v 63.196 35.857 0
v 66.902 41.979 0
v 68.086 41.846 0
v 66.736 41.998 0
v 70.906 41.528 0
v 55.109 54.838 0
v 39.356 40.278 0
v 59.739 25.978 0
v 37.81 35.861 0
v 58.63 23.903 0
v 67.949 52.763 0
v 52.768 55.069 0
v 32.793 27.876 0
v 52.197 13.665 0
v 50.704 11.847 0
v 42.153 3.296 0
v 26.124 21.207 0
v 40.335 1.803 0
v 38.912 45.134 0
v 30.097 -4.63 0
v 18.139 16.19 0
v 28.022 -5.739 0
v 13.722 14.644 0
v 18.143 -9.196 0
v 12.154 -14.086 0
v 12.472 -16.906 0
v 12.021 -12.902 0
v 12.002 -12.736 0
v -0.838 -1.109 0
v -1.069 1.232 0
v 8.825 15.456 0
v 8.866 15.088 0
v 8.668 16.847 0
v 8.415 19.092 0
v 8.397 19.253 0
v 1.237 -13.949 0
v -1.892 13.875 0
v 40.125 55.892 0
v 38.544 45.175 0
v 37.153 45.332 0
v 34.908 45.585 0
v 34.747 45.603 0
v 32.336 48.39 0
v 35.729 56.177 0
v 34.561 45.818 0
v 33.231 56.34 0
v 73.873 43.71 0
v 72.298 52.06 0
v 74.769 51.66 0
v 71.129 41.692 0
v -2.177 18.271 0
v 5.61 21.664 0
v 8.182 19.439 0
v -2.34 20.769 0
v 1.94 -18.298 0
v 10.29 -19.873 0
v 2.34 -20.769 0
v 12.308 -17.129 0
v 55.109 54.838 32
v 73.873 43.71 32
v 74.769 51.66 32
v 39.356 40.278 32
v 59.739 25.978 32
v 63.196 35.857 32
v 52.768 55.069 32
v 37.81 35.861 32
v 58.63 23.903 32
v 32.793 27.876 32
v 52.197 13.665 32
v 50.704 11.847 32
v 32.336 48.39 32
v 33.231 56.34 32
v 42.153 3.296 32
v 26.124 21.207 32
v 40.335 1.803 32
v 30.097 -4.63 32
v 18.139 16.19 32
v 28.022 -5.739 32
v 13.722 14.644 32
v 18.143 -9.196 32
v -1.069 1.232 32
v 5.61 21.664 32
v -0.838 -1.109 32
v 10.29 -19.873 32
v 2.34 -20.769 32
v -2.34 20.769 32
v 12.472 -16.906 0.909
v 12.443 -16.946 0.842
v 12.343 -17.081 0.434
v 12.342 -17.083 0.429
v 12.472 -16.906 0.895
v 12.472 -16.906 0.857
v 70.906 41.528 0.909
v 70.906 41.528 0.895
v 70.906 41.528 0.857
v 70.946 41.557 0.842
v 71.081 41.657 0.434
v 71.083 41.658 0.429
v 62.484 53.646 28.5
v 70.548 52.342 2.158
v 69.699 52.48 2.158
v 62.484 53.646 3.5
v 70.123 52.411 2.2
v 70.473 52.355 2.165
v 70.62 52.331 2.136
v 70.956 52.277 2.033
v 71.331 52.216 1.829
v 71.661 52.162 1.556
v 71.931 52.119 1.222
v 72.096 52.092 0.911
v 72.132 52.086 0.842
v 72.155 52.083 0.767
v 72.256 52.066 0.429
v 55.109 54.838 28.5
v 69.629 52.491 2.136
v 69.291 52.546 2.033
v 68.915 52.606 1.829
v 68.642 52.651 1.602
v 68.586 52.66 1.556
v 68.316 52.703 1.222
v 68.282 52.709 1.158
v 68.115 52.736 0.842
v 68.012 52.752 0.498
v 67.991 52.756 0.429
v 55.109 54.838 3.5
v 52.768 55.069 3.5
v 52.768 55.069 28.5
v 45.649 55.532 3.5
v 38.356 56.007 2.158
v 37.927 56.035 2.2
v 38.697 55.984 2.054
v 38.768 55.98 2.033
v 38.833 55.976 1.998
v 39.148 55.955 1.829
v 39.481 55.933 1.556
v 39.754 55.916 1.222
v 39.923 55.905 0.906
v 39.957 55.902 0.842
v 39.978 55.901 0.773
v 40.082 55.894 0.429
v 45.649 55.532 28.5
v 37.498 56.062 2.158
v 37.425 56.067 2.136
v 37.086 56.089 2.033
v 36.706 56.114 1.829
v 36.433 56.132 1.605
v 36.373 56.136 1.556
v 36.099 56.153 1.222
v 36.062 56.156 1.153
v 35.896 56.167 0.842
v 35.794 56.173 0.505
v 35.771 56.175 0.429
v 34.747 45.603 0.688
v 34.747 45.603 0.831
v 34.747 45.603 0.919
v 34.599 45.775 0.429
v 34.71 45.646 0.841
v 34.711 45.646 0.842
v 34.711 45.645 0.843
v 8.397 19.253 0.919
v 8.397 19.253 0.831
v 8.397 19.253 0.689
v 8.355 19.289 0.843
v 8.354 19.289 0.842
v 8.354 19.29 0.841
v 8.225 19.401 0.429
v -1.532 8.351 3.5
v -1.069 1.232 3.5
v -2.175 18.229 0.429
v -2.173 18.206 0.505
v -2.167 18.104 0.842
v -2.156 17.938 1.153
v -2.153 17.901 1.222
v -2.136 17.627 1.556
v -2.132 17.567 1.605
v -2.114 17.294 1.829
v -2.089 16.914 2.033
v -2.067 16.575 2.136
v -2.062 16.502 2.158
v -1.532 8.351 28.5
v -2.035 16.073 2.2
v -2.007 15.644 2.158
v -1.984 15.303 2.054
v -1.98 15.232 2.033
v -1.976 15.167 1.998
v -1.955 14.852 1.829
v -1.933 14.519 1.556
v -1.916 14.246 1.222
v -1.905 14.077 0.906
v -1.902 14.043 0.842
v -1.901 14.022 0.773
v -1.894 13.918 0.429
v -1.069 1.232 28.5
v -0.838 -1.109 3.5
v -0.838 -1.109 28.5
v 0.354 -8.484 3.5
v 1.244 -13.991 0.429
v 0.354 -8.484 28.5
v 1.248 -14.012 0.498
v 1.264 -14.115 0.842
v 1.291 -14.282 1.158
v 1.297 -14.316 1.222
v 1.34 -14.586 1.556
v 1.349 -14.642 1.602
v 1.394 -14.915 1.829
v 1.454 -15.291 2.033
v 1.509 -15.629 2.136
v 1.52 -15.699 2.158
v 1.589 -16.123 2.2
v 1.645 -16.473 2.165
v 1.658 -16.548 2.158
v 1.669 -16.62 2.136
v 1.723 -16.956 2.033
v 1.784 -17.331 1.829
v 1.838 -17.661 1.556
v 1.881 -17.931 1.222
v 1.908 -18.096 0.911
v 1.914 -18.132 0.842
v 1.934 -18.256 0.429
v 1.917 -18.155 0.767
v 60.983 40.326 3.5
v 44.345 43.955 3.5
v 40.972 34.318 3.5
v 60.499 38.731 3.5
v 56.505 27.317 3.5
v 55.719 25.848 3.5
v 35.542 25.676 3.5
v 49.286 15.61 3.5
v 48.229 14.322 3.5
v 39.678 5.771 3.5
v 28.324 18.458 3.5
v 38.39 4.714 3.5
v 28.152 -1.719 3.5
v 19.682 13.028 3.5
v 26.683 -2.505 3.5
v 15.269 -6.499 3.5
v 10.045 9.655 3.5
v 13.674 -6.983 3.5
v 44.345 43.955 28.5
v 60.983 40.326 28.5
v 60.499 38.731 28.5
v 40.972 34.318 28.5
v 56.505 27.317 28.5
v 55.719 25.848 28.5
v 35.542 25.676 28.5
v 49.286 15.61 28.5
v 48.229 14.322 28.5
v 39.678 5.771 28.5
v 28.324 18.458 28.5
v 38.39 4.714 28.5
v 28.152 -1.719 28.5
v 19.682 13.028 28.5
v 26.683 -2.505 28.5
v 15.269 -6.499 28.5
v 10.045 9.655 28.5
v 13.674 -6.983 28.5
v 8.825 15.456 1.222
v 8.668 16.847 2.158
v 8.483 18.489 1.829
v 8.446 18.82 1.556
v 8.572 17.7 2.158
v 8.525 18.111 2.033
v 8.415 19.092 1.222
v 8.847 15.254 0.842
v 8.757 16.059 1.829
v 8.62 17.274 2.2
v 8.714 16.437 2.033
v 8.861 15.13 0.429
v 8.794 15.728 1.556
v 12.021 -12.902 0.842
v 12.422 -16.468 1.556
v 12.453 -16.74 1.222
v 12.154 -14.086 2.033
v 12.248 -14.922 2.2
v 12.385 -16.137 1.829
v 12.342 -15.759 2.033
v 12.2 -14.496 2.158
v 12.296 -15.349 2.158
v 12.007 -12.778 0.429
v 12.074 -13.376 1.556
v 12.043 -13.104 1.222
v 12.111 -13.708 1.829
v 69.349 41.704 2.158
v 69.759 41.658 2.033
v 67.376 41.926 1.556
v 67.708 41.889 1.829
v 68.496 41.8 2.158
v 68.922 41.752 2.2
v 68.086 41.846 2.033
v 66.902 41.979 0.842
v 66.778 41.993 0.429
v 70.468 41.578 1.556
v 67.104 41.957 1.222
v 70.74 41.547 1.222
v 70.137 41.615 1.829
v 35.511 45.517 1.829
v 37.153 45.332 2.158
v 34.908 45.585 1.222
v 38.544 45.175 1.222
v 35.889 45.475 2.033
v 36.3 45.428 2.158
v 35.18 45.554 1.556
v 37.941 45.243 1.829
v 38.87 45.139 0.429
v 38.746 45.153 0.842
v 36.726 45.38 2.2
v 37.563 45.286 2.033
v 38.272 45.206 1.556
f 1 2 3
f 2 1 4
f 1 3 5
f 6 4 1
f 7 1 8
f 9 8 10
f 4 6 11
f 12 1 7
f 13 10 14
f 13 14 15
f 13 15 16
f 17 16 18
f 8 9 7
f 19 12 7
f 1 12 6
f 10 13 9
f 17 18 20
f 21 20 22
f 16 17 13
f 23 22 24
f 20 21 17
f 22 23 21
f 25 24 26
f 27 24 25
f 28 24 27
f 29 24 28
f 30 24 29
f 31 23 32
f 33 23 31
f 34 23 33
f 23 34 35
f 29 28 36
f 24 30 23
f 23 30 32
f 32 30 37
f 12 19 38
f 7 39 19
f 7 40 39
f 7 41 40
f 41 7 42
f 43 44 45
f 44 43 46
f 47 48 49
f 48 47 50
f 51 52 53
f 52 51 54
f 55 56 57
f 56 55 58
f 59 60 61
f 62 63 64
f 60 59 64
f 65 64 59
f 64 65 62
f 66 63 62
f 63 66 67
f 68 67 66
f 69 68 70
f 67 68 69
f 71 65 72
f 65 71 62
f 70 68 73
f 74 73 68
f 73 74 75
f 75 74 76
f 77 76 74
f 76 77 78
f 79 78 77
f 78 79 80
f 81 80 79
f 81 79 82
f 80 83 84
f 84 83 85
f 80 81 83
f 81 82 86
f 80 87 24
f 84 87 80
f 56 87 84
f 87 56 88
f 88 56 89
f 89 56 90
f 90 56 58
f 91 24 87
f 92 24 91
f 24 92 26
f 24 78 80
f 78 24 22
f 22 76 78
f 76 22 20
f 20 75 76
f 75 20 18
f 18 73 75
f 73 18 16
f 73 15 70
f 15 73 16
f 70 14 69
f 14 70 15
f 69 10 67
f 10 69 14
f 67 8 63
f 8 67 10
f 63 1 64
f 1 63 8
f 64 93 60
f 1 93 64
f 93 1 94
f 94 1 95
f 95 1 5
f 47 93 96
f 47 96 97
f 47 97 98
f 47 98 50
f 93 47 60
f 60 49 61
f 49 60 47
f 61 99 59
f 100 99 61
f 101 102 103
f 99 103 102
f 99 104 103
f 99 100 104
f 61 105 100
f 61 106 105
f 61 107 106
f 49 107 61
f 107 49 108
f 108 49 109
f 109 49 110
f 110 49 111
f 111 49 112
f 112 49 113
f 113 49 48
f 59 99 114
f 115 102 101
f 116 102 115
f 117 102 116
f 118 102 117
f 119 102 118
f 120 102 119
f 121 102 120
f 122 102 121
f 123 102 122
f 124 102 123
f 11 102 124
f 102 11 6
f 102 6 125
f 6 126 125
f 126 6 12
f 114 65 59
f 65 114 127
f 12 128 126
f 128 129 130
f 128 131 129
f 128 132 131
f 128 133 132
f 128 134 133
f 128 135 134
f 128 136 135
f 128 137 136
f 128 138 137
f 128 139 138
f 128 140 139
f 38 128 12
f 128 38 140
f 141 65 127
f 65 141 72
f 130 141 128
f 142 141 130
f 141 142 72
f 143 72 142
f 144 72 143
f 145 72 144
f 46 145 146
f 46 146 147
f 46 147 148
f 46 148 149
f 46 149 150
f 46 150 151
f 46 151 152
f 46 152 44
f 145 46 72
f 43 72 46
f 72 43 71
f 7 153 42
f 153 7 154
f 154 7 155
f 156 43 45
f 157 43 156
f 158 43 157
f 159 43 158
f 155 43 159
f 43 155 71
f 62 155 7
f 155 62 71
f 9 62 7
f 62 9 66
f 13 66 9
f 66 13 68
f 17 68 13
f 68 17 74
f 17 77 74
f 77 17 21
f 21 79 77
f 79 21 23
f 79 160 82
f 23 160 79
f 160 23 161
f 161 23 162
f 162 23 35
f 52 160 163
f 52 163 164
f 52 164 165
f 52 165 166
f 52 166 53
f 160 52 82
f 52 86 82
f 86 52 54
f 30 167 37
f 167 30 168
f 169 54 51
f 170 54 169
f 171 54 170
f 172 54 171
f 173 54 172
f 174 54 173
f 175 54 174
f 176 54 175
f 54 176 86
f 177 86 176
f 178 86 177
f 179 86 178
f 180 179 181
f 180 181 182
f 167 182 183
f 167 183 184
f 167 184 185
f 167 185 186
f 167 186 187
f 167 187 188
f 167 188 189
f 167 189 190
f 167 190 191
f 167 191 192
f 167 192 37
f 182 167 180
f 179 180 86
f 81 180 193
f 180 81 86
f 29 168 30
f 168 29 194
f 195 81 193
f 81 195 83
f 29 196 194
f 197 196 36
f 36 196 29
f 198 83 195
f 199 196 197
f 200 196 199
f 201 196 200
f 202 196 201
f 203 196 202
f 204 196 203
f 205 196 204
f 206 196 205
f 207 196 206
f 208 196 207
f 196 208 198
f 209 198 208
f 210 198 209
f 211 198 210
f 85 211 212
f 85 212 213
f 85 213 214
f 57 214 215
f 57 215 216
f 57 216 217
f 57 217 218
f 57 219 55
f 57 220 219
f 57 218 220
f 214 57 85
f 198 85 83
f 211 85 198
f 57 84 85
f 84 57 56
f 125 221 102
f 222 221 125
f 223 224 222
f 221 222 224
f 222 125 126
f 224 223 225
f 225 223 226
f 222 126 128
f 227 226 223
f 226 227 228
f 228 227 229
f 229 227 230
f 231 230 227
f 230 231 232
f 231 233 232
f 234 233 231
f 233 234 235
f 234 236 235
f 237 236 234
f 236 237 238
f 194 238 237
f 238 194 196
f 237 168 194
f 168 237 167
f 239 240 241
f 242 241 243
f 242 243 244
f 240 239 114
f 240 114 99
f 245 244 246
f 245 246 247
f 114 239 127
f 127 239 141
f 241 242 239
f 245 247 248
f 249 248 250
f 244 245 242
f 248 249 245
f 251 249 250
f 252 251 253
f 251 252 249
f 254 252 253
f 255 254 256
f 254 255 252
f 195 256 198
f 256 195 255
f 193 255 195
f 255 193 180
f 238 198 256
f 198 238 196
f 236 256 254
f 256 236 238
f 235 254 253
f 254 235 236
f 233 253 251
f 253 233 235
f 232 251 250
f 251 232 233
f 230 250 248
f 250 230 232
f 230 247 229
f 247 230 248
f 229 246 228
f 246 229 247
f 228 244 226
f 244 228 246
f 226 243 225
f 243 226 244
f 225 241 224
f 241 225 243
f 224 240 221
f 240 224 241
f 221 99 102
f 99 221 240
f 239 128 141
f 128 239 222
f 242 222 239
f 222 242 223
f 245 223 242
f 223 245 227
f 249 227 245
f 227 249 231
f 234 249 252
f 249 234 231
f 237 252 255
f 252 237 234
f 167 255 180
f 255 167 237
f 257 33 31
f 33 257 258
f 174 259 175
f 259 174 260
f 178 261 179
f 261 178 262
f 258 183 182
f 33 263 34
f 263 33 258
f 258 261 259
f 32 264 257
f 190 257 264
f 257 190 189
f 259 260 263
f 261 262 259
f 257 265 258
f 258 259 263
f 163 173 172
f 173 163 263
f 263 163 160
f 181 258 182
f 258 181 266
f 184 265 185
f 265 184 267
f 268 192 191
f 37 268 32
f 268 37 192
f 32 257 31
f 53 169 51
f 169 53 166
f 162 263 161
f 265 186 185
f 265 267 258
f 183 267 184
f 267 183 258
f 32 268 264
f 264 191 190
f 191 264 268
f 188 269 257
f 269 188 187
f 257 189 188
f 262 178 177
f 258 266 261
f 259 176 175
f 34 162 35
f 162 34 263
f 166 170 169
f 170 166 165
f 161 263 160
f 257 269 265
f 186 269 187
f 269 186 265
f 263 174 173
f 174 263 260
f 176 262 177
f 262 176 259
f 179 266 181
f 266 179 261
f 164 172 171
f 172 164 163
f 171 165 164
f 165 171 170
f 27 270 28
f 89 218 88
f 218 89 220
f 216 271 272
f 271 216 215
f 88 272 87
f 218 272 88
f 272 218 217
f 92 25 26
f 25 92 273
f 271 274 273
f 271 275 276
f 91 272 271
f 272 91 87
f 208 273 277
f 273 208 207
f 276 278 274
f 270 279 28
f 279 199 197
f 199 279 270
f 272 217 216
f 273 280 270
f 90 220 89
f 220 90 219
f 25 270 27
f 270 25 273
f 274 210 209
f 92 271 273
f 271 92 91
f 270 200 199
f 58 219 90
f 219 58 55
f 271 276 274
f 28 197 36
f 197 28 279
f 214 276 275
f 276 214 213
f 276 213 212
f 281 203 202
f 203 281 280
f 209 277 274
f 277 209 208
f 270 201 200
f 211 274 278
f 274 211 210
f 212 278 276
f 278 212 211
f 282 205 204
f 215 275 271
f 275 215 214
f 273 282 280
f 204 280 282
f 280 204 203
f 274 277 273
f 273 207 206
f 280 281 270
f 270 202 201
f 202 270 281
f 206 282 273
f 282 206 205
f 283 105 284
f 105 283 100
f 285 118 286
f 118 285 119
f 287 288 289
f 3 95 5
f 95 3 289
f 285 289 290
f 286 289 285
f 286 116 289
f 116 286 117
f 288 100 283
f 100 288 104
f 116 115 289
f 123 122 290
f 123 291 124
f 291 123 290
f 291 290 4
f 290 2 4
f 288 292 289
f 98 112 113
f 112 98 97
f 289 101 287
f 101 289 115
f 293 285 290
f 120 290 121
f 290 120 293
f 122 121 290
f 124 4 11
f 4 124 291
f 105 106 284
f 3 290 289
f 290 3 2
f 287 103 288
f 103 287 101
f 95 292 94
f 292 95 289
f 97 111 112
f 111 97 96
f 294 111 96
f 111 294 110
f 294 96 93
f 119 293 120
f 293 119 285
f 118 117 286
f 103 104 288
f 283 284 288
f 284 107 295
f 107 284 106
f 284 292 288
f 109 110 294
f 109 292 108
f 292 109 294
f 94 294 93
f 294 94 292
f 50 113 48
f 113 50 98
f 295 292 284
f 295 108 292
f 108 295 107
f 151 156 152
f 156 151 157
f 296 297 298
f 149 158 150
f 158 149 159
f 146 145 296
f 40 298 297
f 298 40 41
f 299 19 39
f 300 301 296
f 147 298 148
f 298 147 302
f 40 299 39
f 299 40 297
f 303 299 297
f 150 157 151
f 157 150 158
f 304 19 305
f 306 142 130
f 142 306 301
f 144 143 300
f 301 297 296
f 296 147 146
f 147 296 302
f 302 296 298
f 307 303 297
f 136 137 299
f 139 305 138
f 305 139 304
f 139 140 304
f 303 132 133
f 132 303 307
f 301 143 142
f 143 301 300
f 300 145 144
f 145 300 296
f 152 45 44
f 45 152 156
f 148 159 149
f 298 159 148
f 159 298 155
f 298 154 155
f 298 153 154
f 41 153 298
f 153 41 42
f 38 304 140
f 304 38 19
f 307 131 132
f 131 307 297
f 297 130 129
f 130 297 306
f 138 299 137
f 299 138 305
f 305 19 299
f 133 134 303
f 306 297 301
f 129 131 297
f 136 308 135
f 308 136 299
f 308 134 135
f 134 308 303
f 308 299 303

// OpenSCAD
$fn = 32;

// ----------------------------------------------------------------------
// Air duct: 24 mm duct, 3.5 mm wall, 32 mm across
// ----------------------------------------------------------------------

// --- parameters (mm) ---
duct_r = 12;              // duct core radius
duct_d = 24;              // duct core diameter
wall = 3.5;               // duct wall thickness
height = 32;              // duct width (extrusion height)
port_r = 20.9;            // port flange half width
port_d = 41.8;            // port flange width
port_t = 8;               // port flange thickness
bolt_d = 4.4;             // port bolt holes
bolt_offset = 16.2;       // bolt hole offset from the port axis

difference() {
  /* outer hull chain: tube with a flat flange plate at every port */
  linear_extrude(height = 32) {
    hull() {
      polygon([[2.34, -20.769], [-2.34, 20.769], [5.61, 21.664], [10.29, -19.873]]);
      translate([10.931, 1.232]) circle(r = 12);
    }
    hull() {
      translate([10.931, 1.232]) circle(r = 12);
      translate([12.016, 1.354]) circle(r = 12);
    }
    hull() {
      translate([12.016, 1.354]) circle(r = 12);
      translate([23.43, 5.348]) circle(r = 12);
    }
    hull() {
      translate([23.43, 5.348]) circle(r = 12);
      translate([33.668, 11.781]) circle(r = 12);
    }
    hull() {
      translate([33.668, 11.781]) circle(r = 12);
      translate([42.219, 20.332]) circle(r = 12);
    }
    hull() {
      translate([42.219, 20.332]) circle(r = 12);
      translate([48.652, 30.57]) circle(r = 12);
    }
    hull() {
      translate([48.652, 30.57]) circle(r = 12);
      translate([52.646, 41.984]) circle(r = 12);
    }
    hull() {
      translate([52.646, 41.984]) circle(r = 12);
      translate([52.768, 43.069]) circle(r = 12);
    }
    hull() {
      translate([52.768, 43.069]) circle(r = 12);
      polygon([[33.231, 56.34], [74.769, 51.66], [73.873, 43.71], [32.336, 48.39]]);
    }
  }
  /* air passage: the same chain inset by the wall, 5 mm proud of the ports */
  translate([0, 0, 3.5]) linear_extrude(height = 25) {
    hull() {
      translate([-4.969, -0.56]) circle(r = 8.5);
      translate([12.016, 1.354]) circle(r = 8.5);
    }
    hull() {
      translate([12.016, 1.354]) circle(r = 8.5);
      translate([23.43, 5.348]) circle(r = 8.5);
    }
    hull() {
      translate([23.43, 5.348]) circle(r = 8.5);
      translate([33.668, 11.781]) circle(r = 8.5);
    }
    hull() {
      translate([33.668, 11.781]) circle(r = 8.5);
      translate([42.219, 20.332]) circle(r = 8.5);
    }
    hull() {
      translate([42.219, 20.332]) circle(r = 8.5);
      translate([48.652, 30.57]) circle(r = 8.5);
    }
    hull() {
      translate([48.652, 30.57]) circle(r = 8.5);
      translate([52.646, 41.984]) circle(r = 8.5);
    }
    hull() {
      translate([52.646, 41.984]) circle(r = 8.5);
      translate([54.56, 58.969]) circle(r = 8.5);
    }
  }
  translate([0, 0]) rotate([0, 0, -83.57]) translate([-16.2, -2.5]) rotate([-90, 0, 0]) cylinder(h = 13, d = 4.4);
  translate([0, 0]) rotate([0, 0, -83.57]) translate([16.2, -2.5]) rotate([-90, 0, 0]) cylinder(h = 13, d = 4.4);
  translate([54, 54]) rotate([0, 0, 173.57]) translate([-16.2, -2.5]) rotate([-90, 0, 0]) cylinder(h = 13, d = 4.4);
  translate([54, 54]) rotate([0, 0, 173.57]) translate([16.2, -2.5]) rotate([-90, 0, 0]) cylinder(h = 13, d = 4.4);
}
